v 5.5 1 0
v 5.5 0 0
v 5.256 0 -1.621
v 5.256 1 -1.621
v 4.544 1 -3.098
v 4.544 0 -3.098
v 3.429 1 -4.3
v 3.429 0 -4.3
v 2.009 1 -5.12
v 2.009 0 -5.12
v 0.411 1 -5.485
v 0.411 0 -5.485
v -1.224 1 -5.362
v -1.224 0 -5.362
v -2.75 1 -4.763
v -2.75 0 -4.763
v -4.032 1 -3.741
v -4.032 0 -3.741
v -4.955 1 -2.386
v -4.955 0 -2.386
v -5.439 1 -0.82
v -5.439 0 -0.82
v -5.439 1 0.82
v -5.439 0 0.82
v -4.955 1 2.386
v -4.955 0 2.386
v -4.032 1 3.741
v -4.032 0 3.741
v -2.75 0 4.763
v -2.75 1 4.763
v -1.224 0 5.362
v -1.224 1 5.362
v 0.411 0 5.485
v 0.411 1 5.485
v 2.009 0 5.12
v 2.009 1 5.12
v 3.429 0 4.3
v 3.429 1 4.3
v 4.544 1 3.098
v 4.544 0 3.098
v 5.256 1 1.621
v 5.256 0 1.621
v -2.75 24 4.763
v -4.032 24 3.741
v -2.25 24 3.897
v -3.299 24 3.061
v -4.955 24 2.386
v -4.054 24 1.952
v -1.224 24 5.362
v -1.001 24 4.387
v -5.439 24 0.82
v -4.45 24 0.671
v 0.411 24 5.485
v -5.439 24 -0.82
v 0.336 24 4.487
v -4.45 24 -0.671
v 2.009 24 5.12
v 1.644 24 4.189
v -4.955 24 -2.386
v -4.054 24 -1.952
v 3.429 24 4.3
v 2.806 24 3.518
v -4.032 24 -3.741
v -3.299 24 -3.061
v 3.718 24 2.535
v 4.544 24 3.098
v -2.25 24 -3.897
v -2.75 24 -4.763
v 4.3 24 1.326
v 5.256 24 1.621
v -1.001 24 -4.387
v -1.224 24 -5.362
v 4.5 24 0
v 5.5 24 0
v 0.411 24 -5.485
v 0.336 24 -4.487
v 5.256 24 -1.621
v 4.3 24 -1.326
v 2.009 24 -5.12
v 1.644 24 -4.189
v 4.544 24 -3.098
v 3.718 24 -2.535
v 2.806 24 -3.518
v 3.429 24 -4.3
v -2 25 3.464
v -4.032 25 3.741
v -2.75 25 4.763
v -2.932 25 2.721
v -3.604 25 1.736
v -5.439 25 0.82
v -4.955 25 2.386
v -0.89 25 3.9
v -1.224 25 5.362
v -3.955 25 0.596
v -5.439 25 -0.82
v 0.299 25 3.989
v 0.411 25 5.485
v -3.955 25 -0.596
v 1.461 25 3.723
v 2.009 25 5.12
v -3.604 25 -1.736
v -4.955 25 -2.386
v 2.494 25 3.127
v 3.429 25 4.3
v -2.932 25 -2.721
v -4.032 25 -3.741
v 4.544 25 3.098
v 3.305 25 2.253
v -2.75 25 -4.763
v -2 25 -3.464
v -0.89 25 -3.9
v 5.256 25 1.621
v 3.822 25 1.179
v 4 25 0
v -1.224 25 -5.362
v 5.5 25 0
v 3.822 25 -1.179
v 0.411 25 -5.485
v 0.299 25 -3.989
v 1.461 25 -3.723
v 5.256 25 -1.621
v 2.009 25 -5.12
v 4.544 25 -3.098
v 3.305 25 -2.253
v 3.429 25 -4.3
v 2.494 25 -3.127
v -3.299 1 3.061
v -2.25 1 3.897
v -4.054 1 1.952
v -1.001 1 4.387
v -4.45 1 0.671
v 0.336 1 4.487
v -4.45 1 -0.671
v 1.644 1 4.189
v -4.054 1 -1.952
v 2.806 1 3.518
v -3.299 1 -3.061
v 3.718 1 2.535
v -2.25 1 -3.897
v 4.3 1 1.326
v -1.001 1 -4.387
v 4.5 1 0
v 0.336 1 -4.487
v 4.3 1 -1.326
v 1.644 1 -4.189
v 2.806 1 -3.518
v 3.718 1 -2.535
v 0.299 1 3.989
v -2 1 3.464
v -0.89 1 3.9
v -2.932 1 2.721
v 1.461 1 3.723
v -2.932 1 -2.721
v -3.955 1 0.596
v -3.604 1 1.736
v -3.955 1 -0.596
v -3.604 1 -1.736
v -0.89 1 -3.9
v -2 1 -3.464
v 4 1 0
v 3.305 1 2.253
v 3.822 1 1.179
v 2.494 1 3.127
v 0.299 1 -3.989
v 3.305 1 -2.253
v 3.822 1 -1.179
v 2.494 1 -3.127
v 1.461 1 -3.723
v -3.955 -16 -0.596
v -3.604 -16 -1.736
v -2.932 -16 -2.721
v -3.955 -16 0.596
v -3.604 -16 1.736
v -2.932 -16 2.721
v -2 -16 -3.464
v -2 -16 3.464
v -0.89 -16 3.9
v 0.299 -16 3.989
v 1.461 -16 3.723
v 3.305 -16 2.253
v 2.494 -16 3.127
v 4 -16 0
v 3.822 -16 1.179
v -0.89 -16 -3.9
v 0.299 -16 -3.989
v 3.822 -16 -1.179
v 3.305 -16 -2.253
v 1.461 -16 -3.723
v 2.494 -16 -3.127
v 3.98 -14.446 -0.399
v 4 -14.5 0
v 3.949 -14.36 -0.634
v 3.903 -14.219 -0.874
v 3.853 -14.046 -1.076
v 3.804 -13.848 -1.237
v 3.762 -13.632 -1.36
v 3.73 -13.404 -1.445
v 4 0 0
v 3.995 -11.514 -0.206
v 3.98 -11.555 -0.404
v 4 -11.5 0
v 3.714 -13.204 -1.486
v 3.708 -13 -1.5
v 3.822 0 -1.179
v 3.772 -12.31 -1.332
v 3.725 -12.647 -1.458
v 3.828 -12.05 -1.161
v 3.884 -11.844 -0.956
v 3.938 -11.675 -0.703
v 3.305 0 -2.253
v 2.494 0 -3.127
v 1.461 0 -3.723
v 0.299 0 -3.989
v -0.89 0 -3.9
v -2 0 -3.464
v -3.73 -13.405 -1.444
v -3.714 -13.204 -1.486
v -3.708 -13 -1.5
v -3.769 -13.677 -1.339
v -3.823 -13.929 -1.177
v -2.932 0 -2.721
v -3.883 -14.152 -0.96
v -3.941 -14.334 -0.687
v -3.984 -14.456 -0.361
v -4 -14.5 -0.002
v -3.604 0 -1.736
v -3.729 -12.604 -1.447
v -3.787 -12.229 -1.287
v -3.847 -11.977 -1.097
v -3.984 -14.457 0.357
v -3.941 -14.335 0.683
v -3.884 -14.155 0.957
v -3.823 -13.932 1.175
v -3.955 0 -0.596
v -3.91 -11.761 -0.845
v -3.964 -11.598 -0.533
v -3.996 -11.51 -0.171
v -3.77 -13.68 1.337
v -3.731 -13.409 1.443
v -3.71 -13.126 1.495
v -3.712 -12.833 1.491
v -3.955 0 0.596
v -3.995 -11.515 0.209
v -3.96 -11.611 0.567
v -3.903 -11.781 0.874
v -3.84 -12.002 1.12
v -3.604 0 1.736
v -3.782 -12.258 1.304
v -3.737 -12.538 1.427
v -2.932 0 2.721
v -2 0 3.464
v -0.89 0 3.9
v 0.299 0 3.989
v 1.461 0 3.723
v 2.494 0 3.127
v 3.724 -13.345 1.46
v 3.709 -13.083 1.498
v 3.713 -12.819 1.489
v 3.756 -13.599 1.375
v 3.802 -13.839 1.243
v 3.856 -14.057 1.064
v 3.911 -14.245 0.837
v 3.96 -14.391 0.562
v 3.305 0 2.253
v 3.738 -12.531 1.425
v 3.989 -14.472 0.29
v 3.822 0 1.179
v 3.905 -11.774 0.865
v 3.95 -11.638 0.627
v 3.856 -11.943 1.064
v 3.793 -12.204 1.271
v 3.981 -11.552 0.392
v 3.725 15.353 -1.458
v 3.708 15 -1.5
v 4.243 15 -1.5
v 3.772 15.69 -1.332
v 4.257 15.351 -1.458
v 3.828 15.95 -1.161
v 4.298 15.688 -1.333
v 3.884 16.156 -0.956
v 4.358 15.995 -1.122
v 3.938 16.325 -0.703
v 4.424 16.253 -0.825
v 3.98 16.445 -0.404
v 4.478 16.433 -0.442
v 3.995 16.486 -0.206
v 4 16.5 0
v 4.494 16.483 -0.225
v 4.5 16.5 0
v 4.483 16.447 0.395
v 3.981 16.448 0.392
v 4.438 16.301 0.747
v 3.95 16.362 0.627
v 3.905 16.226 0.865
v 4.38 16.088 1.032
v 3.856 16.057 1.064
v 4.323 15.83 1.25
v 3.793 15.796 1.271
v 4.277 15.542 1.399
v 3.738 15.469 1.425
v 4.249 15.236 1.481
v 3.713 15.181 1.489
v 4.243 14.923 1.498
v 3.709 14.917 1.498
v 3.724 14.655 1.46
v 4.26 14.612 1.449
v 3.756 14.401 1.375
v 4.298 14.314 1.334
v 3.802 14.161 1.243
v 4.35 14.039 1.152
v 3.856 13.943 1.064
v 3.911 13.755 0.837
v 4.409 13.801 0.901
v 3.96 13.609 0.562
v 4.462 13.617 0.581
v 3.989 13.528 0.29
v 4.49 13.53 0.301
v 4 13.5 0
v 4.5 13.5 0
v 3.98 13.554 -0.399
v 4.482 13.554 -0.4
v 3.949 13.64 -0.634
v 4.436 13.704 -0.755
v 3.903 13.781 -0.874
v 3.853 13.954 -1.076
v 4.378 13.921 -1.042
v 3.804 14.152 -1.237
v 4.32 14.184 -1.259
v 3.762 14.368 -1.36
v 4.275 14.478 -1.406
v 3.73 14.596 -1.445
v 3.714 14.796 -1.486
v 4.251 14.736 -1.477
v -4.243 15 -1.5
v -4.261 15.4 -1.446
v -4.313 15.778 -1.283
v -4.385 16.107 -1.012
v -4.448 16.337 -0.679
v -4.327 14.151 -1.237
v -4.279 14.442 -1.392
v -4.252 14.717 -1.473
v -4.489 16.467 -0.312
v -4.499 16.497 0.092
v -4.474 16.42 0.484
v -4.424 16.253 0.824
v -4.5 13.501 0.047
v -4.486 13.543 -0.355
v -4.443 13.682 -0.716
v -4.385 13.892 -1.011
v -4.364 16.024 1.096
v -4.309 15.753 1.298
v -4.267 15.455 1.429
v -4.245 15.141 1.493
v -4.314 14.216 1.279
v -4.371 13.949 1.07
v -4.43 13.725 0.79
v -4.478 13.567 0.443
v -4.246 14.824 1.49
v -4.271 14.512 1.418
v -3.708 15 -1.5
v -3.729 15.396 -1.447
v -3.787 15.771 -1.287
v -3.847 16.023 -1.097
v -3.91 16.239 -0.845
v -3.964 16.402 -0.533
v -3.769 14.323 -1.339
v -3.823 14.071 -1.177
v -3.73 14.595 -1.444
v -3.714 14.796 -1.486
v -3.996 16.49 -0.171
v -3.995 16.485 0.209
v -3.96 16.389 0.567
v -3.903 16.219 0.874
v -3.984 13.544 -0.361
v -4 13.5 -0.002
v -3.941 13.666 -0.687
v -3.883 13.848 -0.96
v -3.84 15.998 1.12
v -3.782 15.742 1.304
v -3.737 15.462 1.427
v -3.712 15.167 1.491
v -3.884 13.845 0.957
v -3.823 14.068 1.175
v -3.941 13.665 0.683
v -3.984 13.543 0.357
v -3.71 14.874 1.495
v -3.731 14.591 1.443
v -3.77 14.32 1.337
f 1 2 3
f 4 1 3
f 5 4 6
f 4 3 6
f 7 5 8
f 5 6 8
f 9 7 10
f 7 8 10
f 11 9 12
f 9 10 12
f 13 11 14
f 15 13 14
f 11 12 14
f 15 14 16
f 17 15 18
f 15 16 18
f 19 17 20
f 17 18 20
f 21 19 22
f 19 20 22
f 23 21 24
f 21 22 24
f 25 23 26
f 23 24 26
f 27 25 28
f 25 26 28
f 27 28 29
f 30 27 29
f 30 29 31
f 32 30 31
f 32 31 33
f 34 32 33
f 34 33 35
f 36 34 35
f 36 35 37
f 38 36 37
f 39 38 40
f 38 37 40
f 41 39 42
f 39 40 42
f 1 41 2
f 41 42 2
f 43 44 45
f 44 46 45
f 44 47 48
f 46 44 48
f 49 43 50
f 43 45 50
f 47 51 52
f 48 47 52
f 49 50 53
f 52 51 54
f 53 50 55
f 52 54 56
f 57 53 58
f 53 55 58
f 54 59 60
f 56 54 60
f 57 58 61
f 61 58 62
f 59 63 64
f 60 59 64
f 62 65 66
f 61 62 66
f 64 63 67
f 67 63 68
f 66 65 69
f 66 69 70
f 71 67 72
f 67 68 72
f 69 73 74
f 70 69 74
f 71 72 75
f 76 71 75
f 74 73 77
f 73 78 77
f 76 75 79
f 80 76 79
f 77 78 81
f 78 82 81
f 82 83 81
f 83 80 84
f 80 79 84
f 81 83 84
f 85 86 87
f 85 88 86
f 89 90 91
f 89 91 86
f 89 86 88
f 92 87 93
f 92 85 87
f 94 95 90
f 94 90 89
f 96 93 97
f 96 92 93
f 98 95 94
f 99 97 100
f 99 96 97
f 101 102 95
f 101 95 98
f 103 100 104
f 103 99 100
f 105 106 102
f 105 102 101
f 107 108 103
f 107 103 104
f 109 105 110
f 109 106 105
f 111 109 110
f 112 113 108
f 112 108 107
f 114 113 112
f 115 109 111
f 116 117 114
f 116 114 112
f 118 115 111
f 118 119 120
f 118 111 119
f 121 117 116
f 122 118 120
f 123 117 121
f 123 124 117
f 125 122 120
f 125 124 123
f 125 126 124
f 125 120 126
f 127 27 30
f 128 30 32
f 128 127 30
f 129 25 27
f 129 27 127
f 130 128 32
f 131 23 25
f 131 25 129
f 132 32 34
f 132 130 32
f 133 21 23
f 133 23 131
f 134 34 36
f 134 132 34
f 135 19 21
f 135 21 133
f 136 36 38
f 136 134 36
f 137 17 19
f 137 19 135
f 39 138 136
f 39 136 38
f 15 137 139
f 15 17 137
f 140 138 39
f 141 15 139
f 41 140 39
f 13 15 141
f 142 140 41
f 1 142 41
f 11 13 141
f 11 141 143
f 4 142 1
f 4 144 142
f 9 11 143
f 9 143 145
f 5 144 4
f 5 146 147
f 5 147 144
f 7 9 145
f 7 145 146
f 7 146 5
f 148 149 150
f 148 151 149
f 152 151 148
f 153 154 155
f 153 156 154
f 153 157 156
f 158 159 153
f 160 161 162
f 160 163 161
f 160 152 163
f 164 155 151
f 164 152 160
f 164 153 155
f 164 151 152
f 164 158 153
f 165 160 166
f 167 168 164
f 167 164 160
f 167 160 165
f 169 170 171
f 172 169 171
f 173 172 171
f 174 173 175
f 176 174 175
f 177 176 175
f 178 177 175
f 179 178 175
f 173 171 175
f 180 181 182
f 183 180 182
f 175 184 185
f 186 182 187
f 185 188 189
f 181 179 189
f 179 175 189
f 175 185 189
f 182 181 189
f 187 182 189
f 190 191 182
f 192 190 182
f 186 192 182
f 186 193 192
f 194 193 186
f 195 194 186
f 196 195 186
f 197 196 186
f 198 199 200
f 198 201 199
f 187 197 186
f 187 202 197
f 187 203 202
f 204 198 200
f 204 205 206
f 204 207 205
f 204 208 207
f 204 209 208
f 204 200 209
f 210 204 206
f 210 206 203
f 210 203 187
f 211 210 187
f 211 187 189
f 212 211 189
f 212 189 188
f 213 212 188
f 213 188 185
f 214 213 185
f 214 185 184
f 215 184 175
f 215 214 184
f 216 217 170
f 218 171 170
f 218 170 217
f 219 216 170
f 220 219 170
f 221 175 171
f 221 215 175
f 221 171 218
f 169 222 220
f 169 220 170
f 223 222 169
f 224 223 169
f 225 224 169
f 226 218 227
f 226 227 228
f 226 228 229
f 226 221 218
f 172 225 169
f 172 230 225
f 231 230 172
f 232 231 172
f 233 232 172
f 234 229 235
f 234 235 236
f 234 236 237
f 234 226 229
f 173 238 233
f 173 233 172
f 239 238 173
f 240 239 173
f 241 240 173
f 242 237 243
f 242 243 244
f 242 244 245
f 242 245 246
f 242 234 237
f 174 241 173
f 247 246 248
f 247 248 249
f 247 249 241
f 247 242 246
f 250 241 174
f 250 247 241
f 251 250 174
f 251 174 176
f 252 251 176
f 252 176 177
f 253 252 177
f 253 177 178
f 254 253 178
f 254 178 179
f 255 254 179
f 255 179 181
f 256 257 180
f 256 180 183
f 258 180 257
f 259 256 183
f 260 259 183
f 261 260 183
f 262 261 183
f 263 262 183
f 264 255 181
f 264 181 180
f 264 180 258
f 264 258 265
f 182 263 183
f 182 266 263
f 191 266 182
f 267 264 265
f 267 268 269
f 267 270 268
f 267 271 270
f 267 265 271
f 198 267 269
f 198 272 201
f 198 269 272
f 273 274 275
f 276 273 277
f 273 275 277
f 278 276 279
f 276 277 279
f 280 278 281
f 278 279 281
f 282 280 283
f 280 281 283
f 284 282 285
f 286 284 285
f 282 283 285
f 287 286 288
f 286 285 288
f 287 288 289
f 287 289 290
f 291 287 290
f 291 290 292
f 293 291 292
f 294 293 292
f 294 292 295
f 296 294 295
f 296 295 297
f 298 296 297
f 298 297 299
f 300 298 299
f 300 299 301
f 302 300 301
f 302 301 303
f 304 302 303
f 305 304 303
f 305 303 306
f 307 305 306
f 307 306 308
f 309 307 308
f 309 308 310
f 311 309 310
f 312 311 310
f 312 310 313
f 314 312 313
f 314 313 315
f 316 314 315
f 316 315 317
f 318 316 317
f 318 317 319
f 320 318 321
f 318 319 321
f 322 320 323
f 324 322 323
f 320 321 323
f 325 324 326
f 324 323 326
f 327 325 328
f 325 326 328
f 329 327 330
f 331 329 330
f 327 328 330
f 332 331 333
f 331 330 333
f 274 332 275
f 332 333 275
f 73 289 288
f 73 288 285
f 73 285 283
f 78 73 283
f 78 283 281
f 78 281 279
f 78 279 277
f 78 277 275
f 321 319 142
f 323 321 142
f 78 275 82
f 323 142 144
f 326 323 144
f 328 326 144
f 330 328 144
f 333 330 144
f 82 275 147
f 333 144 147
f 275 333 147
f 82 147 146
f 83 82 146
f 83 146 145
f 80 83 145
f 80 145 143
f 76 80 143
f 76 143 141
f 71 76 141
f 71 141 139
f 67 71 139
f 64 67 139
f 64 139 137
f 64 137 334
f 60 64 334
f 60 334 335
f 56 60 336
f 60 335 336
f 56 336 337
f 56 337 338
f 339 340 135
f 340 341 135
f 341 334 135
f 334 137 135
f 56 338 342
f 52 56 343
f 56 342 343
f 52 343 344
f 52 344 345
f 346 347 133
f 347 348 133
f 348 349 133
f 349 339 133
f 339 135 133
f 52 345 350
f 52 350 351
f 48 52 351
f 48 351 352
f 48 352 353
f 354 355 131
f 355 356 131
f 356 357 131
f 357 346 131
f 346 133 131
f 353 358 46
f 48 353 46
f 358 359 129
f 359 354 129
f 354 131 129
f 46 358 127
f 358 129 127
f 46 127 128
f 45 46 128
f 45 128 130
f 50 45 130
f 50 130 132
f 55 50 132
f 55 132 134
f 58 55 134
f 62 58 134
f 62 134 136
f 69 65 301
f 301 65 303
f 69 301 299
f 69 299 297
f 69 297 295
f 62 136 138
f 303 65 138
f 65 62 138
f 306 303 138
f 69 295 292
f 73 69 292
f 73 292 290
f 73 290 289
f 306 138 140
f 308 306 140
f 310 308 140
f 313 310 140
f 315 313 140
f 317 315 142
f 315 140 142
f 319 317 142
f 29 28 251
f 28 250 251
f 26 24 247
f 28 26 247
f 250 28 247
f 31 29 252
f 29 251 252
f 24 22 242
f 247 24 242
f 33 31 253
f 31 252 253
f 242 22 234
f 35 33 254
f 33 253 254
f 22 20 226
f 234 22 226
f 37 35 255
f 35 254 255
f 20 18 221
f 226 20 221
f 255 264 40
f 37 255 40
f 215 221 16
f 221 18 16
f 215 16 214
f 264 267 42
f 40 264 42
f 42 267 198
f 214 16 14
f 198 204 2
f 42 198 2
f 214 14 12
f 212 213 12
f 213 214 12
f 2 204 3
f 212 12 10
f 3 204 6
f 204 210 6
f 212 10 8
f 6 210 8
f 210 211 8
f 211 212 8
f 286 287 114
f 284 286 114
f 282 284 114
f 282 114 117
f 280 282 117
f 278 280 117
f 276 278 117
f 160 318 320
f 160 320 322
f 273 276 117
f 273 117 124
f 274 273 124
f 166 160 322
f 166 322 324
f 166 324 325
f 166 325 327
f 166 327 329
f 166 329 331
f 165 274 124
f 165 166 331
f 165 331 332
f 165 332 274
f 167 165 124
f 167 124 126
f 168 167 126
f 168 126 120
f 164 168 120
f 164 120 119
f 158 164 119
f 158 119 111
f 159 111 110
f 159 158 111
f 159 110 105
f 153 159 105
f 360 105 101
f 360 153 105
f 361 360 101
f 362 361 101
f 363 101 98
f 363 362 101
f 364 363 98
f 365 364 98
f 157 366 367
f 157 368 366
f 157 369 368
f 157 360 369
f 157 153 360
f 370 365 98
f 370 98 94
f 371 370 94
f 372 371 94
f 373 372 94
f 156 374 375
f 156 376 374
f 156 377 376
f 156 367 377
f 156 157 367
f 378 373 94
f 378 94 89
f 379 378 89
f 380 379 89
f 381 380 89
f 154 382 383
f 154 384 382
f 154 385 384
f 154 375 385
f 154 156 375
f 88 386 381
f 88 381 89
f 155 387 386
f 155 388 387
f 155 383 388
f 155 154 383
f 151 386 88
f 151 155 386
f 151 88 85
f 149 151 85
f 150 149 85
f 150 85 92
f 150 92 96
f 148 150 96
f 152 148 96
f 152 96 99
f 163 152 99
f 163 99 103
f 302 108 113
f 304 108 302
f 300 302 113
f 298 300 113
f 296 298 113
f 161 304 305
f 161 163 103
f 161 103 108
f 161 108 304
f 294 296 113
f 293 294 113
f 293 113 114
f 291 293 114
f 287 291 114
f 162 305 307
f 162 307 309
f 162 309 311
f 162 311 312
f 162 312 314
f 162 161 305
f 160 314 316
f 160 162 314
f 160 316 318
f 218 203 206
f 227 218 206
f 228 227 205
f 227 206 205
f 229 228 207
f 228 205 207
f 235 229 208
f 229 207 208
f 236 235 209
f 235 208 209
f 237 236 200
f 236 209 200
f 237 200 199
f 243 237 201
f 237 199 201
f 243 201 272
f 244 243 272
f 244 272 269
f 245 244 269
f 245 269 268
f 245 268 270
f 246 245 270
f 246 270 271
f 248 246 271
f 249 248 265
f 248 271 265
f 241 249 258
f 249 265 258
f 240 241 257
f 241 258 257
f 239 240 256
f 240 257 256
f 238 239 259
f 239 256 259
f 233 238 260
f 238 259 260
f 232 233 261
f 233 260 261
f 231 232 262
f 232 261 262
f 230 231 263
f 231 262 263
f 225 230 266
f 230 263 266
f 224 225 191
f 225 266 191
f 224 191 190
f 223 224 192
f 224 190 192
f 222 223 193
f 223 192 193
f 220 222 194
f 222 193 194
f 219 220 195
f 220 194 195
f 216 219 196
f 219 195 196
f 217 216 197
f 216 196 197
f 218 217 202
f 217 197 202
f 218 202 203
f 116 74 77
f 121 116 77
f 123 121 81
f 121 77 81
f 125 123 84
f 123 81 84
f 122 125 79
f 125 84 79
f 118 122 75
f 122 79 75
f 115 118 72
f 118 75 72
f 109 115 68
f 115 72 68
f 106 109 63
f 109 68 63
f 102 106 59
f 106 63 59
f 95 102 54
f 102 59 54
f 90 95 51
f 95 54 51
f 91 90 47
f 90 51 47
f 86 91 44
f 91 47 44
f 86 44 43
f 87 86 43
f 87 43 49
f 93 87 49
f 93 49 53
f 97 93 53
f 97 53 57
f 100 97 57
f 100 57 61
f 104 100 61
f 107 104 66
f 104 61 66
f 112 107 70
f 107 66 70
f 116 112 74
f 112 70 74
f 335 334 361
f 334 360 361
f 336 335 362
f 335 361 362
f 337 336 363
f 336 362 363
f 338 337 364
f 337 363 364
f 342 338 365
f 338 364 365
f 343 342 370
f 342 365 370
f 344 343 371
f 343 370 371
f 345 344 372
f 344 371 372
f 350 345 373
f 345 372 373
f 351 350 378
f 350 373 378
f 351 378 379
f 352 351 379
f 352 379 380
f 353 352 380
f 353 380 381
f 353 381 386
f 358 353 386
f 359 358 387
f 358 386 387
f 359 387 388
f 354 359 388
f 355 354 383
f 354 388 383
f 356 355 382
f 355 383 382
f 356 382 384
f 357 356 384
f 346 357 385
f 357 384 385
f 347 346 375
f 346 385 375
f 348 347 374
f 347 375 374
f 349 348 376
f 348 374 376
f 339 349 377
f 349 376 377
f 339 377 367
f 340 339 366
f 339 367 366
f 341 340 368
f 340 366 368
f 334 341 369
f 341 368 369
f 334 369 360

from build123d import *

# Parameters (mm, degrees)
SKETCH1_R           = 5.5
BOSS_EXTRUDE1_DEPTH = 1
SKETCH1_3_R         = 4
BOSS_EXTRUDE2_DEPTH = 16
SKETCH2_R           = 1.5
CUT_EXTRUDE1_DEPTH  = 13
BOSS_EXTRUDE3_START = 25
SKETCH1_4_R         = 4.5
SKETCH1_4_R_2       = 4
BOSS_EXTRUDE3_DEPTH = 25
BOSS_EXTRUDE4_START = 24
SKETCH1_5_R         = 5.5
SKETCH1_5_R_2       = 4.5
BOSS_EXTRUDE4_DEPTH = 1
SKETCH5_R           = 1.5
CUT_EXTRUDE2_DEPTH  = 11.5


with BuildPart() as part:
    # Sketch1 → Boss-Extrude1 (new body)
    with BuildSketch(Plane(origin=(0, 0, 0), x_dir=(1, 0, 0), z_dir=(0, 1, 0))):
        Circle(SKETCH1_R)
    extrude(amount=BOSS_EXTRUDE1_DEPTH)

    # Sketch1<3> → Boss-Extrude2 (add)
    with BuildSketch(Plane(origin=(0, 0, 0), x_dir=(1, 0, 0), z_dir=(0, 1, 0))):
        Circle(SKETCH1_3_R)
    extrude(amount=-BOSS_EXTRUDE2_DEPTH)

    # Sketch2 → Cut-Extrude1 (cut)
    with BuildSketch(Plane(origin=(4, 0, 0), x_dir=(0, 0, -1), z_dir=(1, 0, 0))):
        with Locations((0, -13)):
            Circle(SKETCH2_R)
    extrude(amount=-CUT_EXTRUDE1_DEPTH, mode=Mode.SUBTRACT)

    # Sketch1<4> → Boss-Extrude3 (add)
    with BuildSketch(Plane(origin=(0, 0, 0), x_dir=(1, 0, 0), z_dir=(0, 1, 0)).offset(BOSS_EXTRUDE3_START)):
        Circle(SKETCH1_4_R)
        Circle(SKETCH1_4_R_2, mode=Mode.SUBTRACT)
    extrude(amount=-BOSS_EXTRUDE3_DEPTH)

    # Sketch1<5> → Boss-Extrude4 (add)
    with BuildSketch(Plane(origin=(0, 0, 0), x_dir=(1, 0, 0), z_dir=(0, 1, 0)).offset(BOSS_EXTRUDE4_START)):
        Circle(SKETCH1_5_R)
        Circle(SKETCH1_5_R_2, mode=Mode.SUBTRACT)
    extrude(amount=BOSS_EXTRUDE4_DEPTH)

    # Sketch5 → Cut-Extrude2 (cut, symmetric)
    with BuildSketch(Plane(origin=(4, 0, 0), x_dir=(0, 0, -1), z_dir=(1, 0, 0))):
        with Locations((0, 15)):
            Circle(SKETCH5_R)
    extrude(amount=CUT_EXTRUDE2_DEPTH, both=True, mode=Mode.SUBTRACT)


solid = part.part
